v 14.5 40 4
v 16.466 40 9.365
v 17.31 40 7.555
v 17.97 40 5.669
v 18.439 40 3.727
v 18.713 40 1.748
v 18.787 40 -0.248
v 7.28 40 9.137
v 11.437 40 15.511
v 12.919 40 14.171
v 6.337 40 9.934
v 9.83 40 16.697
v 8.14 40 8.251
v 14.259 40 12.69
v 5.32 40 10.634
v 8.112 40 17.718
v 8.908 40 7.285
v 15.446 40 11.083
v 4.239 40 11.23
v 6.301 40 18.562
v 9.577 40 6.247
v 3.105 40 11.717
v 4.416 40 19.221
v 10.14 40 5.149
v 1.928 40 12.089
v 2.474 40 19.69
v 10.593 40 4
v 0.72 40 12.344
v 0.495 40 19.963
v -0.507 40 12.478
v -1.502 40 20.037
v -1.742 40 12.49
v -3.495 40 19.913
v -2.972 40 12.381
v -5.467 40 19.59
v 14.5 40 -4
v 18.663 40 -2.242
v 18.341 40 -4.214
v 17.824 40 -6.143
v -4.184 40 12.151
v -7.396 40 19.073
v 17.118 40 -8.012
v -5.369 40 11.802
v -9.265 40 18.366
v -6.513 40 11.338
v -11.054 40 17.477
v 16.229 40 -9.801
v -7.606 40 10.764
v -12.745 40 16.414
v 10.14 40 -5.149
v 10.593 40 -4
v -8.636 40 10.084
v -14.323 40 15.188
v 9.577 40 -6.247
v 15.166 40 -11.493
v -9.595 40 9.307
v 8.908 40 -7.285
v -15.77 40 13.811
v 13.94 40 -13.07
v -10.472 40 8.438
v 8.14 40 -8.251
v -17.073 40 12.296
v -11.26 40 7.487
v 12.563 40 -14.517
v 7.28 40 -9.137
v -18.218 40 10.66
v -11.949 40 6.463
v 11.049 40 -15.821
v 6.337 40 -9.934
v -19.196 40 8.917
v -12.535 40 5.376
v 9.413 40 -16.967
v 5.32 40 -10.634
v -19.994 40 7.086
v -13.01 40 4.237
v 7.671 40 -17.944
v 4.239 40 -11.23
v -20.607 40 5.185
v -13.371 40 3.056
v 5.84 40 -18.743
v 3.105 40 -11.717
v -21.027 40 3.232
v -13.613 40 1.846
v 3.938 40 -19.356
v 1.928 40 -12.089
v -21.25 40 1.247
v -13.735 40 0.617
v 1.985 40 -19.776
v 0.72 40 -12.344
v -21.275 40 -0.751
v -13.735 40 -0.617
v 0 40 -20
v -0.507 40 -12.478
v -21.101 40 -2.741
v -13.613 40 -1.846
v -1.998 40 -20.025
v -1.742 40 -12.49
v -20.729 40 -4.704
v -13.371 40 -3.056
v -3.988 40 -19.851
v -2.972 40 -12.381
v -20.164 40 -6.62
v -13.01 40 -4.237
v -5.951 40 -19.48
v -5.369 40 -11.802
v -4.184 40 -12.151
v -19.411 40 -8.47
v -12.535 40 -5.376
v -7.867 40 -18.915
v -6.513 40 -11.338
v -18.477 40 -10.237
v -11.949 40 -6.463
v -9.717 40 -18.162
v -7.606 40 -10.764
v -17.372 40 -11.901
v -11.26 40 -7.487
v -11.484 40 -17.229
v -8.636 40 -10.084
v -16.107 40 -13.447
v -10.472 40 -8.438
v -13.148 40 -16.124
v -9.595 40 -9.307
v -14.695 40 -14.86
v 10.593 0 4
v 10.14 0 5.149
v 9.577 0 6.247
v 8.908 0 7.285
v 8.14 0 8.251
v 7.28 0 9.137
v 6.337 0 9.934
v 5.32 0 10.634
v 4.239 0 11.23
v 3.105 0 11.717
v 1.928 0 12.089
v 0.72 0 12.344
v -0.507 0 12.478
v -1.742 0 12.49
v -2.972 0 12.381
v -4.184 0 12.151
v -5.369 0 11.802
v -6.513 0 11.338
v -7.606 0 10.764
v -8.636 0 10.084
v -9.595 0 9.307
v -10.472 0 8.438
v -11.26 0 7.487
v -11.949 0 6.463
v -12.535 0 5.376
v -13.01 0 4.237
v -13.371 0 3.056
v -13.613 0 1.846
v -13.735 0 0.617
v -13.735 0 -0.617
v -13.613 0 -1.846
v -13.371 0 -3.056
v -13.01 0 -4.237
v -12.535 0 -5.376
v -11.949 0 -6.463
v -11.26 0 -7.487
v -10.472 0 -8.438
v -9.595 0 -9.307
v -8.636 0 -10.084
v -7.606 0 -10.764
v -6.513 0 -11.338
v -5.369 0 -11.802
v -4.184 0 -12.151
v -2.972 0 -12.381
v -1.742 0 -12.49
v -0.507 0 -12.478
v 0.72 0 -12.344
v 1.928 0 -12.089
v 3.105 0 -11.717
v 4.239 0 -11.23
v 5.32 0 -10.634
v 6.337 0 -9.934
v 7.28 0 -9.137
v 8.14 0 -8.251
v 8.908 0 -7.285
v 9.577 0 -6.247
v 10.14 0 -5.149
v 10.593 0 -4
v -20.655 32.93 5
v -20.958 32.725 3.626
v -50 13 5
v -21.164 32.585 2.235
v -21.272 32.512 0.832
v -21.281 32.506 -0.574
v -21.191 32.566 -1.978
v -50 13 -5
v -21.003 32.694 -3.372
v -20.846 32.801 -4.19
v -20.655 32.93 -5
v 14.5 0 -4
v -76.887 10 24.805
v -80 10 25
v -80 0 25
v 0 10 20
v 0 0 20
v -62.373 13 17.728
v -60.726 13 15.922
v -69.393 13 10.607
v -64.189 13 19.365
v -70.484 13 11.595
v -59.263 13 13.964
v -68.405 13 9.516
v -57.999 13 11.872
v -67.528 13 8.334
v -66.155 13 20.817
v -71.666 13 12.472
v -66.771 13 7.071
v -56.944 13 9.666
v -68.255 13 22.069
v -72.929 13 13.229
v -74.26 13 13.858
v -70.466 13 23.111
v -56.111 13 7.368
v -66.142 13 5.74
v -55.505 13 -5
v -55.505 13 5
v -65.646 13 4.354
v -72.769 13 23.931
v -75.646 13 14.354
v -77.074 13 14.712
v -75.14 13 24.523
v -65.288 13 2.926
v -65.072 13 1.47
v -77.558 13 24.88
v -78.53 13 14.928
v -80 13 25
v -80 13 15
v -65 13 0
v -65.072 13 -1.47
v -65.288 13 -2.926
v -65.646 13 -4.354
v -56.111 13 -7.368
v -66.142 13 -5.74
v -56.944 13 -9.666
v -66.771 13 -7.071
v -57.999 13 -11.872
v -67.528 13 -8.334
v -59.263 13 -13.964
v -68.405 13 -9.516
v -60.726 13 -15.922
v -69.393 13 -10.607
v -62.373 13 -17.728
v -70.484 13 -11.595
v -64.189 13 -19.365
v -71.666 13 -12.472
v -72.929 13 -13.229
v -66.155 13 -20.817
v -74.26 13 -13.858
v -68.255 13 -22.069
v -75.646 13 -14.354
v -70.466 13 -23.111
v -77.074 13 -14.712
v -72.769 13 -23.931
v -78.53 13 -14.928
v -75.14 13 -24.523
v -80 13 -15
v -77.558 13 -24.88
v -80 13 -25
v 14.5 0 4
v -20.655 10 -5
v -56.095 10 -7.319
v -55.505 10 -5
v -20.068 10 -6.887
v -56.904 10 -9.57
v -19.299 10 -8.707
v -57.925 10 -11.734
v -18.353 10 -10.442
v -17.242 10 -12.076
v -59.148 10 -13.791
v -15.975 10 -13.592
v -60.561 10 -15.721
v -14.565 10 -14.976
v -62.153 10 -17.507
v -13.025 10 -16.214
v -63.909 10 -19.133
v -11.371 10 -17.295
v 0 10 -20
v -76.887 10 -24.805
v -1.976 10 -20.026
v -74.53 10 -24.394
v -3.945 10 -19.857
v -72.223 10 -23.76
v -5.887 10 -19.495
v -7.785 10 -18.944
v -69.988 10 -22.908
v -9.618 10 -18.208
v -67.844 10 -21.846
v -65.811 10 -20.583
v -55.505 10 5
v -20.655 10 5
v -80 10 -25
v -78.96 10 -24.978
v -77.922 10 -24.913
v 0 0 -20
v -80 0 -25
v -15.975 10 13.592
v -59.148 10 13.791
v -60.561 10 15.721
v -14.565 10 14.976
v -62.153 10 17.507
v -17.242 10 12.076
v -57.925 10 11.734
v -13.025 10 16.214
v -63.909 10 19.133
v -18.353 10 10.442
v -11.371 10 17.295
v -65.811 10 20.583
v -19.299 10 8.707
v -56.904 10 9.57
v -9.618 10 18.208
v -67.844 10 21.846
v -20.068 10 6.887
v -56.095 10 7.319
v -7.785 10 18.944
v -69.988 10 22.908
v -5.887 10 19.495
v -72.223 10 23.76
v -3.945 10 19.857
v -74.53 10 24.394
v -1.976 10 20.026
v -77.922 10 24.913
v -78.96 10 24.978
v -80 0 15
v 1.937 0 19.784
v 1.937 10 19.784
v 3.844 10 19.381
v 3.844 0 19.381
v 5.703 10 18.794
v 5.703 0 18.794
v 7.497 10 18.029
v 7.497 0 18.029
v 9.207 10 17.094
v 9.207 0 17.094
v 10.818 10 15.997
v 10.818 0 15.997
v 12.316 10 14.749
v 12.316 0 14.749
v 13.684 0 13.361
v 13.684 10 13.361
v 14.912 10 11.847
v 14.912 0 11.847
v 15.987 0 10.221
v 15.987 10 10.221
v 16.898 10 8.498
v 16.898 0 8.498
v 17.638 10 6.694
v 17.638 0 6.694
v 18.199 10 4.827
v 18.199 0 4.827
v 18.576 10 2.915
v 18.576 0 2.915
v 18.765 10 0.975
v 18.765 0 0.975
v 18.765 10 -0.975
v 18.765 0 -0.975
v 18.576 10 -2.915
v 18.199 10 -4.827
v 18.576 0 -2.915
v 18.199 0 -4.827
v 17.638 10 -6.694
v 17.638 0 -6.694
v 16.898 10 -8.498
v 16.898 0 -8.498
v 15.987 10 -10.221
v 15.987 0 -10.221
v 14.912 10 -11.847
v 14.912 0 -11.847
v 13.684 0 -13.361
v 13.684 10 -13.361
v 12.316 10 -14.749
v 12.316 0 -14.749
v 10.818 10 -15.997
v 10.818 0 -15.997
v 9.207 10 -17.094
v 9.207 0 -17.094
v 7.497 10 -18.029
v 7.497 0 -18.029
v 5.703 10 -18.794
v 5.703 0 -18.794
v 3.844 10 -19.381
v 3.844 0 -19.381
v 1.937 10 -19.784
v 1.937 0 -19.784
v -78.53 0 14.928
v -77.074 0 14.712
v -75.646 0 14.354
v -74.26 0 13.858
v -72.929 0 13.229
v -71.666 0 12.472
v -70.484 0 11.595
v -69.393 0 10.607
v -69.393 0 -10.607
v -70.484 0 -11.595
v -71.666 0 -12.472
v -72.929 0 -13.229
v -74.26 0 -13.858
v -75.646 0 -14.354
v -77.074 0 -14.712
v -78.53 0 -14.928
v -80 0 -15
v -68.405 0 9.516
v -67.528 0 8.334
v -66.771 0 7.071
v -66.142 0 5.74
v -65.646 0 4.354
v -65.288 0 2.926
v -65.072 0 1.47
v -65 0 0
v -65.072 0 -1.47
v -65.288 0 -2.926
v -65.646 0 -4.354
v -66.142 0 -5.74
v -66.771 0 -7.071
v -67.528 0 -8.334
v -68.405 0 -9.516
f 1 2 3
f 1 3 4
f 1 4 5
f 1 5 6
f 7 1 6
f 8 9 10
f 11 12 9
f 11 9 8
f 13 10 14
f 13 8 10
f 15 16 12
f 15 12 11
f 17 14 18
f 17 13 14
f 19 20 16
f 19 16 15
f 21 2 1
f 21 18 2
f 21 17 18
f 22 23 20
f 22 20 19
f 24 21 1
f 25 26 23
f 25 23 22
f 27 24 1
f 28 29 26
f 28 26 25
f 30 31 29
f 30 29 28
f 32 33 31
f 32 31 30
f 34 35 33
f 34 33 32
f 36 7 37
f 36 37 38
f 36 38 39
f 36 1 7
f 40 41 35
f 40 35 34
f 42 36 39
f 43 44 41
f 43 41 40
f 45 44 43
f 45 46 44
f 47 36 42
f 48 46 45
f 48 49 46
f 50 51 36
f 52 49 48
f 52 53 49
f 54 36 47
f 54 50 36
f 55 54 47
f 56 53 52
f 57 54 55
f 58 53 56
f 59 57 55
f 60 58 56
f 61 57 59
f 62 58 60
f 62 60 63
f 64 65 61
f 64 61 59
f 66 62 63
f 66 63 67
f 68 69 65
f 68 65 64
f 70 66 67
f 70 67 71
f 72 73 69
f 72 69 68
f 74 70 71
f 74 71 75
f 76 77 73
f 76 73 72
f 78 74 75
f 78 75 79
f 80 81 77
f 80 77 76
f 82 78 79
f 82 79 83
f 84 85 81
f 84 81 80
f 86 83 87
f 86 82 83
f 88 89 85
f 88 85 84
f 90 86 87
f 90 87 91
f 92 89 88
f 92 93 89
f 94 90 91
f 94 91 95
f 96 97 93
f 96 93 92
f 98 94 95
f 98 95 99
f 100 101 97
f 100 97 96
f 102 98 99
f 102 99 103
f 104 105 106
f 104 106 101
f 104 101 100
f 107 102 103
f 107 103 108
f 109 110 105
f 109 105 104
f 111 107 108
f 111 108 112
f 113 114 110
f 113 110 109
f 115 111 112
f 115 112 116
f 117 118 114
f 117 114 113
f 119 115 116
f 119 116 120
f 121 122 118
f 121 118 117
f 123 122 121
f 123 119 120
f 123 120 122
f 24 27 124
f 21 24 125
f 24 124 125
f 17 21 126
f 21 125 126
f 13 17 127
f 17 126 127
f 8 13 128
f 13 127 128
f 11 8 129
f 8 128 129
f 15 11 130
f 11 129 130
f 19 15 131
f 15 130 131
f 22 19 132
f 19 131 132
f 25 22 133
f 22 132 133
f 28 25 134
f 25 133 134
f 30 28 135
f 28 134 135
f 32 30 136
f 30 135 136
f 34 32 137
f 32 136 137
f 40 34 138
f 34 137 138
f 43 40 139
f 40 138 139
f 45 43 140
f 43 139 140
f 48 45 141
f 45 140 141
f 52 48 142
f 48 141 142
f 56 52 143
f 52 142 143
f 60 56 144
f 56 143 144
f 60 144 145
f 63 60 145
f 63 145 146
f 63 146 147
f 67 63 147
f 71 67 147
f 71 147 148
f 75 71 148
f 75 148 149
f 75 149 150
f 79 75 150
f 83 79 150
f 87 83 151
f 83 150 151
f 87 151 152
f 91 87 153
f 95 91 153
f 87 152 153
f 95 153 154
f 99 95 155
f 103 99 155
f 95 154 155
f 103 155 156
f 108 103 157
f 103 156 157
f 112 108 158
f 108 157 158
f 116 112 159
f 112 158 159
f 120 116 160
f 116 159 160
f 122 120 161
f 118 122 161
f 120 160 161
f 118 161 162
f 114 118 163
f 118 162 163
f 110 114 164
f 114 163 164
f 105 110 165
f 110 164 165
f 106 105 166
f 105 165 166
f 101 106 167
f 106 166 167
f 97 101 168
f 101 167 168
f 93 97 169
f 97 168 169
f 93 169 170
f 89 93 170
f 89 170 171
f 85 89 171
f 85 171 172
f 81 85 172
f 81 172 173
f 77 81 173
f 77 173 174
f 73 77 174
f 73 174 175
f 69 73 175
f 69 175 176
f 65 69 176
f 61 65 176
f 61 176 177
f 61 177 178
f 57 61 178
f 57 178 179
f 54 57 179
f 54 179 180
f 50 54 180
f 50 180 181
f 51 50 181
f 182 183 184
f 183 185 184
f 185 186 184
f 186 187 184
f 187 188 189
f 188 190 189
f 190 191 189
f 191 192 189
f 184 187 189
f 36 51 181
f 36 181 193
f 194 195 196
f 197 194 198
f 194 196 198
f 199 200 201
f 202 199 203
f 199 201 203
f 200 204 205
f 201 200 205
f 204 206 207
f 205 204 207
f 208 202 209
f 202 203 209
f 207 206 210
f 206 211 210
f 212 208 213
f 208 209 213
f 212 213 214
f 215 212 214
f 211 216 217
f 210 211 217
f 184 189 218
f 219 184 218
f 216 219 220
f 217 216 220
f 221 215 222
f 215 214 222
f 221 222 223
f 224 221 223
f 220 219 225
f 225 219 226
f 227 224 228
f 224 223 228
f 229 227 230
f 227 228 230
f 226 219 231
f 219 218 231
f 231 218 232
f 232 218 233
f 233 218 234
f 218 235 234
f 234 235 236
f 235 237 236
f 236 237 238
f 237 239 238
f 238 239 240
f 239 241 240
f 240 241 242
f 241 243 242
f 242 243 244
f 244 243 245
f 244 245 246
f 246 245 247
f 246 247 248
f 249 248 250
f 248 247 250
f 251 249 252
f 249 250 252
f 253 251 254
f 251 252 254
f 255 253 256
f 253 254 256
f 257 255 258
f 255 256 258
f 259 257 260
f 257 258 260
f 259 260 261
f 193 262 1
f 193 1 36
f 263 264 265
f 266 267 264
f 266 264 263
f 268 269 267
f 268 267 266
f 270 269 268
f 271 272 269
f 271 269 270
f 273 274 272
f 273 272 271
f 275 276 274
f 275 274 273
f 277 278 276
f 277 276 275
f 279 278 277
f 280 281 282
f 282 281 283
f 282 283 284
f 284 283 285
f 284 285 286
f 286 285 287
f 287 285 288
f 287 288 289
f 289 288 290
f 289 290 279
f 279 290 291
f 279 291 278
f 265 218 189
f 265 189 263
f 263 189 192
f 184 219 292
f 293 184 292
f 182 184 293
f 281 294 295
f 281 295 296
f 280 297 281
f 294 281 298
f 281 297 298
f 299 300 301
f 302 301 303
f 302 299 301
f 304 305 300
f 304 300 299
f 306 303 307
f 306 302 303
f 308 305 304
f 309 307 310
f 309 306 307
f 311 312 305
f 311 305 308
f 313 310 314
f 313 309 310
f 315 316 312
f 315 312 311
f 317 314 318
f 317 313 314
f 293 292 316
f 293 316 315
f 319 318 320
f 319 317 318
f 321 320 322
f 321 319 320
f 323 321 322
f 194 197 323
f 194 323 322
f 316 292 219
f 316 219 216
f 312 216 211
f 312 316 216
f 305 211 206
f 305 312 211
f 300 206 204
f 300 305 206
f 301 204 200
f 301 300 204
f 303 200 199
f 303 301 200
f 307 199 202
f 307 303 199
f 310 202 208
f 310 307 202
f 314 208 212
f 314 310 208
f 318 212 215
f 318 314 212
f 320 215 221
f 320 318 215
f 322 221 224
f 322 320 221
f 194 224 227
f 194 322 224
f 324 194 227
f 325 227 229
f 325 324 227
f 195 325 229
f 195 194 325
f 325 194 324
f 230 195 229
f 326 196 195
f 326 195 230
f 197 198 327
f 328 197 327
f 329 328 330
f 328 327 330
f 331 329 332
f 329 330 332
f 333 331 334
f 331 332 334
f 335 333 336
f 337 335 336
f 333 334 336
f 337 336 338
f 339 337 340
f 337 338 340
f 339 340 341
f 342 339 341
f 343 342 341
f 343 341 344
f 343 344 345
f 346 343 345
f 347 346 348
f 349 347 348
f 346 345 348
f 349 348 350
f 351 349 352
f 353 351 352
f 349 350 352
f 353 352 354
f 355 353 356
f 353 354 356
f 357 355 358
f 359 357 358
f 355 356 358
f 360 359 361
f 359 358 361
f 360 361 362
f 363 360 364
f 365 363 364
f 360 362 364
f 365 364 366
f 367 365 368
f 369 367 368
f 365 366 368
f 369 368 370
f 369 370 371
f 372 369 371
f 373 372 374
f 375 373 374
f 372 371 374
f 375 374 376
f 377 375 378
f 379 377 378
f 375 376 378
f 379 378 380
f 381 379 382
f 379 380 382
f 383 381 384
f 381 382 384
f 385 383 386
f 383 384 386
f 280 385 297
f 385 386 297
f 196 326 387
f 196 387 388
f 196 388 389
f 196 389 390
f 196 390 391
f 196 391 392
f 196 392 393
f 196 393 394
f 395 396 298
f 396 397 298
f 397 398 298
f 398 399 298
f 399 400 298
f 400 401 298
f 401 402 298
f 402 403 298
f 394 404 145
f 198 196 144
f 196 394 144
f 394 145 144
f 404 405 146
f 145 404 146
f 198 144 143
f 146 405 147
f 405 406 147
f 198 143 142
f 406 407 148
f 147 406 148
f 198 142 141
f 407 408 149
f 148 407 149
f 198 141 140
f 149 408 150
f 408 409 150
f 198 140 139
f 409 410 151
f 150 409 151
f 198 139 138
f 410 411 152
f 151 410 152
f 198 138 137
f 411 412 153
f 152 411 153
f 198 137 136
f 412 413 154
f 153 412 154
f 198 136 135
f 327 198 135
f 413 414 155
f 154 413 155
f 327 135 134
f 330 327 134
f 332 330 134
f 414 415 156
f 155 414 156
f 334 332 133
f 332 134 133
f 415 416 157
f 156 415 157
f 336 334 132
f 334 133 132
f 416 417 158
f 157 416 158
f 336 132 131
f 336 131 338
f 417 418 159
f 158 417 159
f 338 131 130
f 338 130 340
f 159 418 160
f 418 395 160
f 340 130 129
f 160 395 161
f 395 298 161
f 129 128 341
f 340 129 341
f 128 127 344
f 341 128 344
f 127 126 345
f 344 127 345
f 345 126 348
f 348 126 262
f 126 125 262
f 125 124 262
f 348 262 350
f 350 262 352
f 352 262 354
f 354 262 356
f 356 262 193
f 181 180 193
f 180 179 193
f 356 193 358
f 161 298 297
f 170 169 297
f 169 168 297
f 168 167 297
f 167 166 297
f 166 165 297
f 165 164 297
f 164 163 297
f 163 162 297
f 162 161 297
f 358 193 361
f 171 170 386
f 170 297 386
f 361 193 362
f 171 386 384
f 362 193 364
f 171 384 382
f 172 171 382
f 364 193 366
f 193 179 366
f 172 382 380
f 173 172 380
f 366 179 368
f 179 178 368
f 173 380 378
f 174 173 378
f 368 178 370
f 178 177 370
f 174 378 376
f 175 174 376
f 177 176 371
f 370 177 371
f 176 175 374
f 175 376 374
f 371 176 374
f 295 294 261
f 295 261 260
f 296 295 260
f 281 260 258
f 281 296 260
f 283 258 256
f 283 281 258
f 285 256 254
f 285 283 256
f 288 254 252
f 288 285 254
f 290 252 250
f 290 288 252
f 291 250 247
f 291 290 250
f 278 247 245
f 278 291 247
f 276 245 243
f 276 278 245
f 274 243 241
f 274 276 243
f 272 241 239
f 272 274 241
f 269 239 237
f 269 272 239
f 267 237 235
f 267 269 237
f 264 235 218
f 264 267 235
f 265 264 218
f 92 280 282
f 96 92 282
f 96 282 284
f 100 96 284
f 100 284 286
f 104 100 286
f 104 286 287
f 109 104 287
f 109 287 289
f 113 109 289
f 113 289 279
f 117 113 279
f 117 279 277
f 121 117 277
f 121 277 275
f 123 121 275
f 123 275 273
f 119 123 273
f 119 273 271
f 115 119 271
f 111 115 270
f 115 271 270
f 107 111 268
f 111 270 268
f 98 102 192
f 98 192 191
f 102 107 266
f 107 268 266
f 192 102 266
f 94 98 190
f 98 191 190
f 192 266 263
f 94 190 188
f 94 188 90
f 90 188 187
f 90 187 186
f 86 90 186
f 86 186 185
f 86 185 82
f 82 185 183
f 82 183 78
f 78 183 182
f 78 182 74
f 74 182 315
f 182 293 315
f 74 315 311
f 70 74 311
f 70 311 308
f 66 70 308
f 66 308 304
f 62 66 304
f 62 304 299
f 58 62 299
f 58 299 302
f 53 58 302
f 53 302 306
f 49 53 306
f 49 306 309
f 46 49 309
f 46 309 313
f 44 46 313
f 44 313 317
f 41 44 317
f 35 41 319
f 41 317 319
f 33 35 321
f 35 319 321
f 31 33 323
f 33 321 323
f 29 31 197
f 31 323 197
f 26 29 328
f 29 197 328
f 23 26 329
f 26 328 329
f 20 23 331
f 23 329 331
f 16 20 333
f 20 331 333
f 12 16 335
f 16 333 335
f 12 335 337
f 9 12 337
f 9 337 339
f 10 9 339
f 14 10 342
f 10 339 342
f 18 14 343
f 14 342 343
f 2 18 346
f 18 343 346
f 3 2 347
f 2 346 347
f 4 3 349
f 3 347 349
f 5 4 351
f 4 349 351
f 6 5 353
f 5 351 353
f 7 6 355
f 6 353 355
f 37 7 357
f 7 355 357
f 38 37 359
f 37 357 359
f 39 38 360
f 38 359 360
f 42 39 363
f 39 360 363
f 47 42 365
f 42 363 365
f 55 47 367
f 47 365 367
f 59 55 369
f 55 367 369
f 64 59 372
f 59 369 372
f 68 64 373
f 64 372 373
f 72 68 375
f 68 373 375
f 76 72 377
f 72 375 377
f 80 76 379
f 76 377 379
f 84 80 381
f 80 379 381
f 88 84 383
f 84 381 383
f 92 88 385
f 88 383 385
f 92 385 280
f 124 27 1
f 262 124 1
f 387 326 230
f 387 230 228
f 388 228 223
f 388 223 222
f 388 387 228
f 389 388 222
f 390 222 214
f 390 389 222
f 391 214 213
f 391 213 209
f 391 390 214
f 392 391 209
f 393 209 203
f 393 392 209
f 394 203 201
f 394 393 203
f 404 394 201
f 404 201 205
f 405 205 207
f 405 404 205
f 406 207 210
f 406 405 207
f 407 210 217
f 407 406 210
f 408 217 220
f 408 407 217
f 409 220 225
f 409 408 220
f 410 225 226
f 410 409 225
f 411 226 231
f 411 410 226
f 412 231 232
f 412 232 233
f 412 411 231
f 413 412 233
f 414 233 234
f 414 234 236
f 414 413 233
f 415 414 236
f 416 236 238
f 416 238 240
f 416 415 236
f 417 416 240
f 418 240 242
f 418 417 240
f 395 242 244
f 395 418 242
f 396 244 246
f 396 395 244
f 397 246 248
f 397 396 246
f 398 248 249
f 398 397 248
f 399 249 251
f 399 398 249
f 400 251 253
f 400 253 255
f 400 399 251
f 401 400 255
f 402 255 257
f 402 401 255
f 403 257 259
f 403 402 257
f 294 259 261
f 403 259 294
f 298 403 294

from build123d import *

# Parameters (mm, degrees)
EXTRUDE_6_DEPTH         = 10
CUT_EXTRUDE_START       = -10
CUT_EXTRUDE_3_DEPTH     = 10
EXTRUDE_3_DEPTH         = 3
SKETCH_20_R             = 20.039024427
EXTRUDE_7_DEPTH         = 30
RIB_START               = -5
RIB_1_DEPTH             = 10
HOLE_WIZARD_25_0_25_1_D = 25
SKETCH_24_W             = 14.5
SKETCH_24_H             = 8
CUT_EXTRUDE_4_DEPTH     = 93.870878105


# Read off the part's stored shape, not the designer's step: 切除-拉伸3, 筋1
with BuildPart() as part:
    # 草图17 → 凸台-拉伸6 (new body)
    with BuildSketch(Plane(origin=(0, 0, 0), x_dir=(1, 0, 0), z_dir=(0, 1, 0))):
        with BuildLine():
            Line((-80, 25), (-80, -25))
            Line((-80, -25), (0, -20))
            ThreePointArc((0, -20), (18.789024427, 0), (0, 20))
            Line((0, 20), (-80, 25))
        make_face()
    extrude(amount=EXTRUDE_6_DEPTH)

    # 切除-拉伸3 outline → 切除-拉伸3 (cut)
    with BuildSketch(Plane(origin=(0, 10, 0), x_dir=(1, 0, 0), z_dir=(0, 1, 0)).offset(CUT_EXTRUDE_START)):
        with BuildLine():
            ThreePointArc((-80, -15), (-65, 0), (-80, 15))
            Line((-80, 15), (-80, -15))
        make_face()
    extrude(amount=CUT_EXTRUDE_3_DEPTH, mode=Mode.SUBTRACT)

    # 草图19 → 拉伸-薄壁3 (add)
    with BuildSketch(Plane(origin=(0, 10, 0), x_dir=(1, 0, 0), z_dir=(0, 1, 0))):
        with BuildLine():
            ThreePointArc((-80, 25), (-55, 0), (-80, -25))
            Line((-80, -25), (-80, -15))
            ThreePointArc((-80, -15), (-65, 0), (-80, 15))
            Line((-80, 15), (-80, 25))
        make_face()
    extrude(amount=EXTRUDE_3_DEPTH)

    # 草图20 → 凸台-拉伸7 (add)
    with BuildSketch(Plane(origin=(0, 10, 0), x_dir=(1, 0, 0), z_dir=(0, 1, 0))):
        with Locations(Location((-1.25, 0, 0), (0, 0, 86.423665625))):
            Circle(SKETCH_20_R)
    extrude(amount=EXTRUDE_7_DEPTH)

    # 筋1 outline → 筋1 (add)
    with BuildSketch(Plane.XY.offset(RIB_START)):
        Polygon((-20.65521837, 32.930470155), (-50, 13), (-57, 13), (-57, 10), (-19, 10), (-19, 34), (-19.080487844, 34), align=None)
    extrude(amount=RIB_1_DEPTH)

    # Ø25.0 (25) 直径孔1 (through all)
    with Locations(Plane(origin=(0, 40, 0), x_dir=(1, 0, 0), z_dir=(0, 1, 0))):
        with Locations((-1.25, 0)):
            Hole(HOLE_WIZARD_25_0_25_1_D / 2)

    # 草图24 → 切除-拉伸4 (cut, through all)
    with BuildSketch(Plane(origin=(0, 40, 0), x_dir=(1, 0, 0), z_dir=(0, 1, 0))):
        with Locations((7.25, 0)):
            Rectangle(SKETCH_24_W, SKETCH_24_H)
    extrude(amount=-CUT_EXTRUDE_4_DEPTH, mode=Mode.SUBTRACT)


solid = part.part
